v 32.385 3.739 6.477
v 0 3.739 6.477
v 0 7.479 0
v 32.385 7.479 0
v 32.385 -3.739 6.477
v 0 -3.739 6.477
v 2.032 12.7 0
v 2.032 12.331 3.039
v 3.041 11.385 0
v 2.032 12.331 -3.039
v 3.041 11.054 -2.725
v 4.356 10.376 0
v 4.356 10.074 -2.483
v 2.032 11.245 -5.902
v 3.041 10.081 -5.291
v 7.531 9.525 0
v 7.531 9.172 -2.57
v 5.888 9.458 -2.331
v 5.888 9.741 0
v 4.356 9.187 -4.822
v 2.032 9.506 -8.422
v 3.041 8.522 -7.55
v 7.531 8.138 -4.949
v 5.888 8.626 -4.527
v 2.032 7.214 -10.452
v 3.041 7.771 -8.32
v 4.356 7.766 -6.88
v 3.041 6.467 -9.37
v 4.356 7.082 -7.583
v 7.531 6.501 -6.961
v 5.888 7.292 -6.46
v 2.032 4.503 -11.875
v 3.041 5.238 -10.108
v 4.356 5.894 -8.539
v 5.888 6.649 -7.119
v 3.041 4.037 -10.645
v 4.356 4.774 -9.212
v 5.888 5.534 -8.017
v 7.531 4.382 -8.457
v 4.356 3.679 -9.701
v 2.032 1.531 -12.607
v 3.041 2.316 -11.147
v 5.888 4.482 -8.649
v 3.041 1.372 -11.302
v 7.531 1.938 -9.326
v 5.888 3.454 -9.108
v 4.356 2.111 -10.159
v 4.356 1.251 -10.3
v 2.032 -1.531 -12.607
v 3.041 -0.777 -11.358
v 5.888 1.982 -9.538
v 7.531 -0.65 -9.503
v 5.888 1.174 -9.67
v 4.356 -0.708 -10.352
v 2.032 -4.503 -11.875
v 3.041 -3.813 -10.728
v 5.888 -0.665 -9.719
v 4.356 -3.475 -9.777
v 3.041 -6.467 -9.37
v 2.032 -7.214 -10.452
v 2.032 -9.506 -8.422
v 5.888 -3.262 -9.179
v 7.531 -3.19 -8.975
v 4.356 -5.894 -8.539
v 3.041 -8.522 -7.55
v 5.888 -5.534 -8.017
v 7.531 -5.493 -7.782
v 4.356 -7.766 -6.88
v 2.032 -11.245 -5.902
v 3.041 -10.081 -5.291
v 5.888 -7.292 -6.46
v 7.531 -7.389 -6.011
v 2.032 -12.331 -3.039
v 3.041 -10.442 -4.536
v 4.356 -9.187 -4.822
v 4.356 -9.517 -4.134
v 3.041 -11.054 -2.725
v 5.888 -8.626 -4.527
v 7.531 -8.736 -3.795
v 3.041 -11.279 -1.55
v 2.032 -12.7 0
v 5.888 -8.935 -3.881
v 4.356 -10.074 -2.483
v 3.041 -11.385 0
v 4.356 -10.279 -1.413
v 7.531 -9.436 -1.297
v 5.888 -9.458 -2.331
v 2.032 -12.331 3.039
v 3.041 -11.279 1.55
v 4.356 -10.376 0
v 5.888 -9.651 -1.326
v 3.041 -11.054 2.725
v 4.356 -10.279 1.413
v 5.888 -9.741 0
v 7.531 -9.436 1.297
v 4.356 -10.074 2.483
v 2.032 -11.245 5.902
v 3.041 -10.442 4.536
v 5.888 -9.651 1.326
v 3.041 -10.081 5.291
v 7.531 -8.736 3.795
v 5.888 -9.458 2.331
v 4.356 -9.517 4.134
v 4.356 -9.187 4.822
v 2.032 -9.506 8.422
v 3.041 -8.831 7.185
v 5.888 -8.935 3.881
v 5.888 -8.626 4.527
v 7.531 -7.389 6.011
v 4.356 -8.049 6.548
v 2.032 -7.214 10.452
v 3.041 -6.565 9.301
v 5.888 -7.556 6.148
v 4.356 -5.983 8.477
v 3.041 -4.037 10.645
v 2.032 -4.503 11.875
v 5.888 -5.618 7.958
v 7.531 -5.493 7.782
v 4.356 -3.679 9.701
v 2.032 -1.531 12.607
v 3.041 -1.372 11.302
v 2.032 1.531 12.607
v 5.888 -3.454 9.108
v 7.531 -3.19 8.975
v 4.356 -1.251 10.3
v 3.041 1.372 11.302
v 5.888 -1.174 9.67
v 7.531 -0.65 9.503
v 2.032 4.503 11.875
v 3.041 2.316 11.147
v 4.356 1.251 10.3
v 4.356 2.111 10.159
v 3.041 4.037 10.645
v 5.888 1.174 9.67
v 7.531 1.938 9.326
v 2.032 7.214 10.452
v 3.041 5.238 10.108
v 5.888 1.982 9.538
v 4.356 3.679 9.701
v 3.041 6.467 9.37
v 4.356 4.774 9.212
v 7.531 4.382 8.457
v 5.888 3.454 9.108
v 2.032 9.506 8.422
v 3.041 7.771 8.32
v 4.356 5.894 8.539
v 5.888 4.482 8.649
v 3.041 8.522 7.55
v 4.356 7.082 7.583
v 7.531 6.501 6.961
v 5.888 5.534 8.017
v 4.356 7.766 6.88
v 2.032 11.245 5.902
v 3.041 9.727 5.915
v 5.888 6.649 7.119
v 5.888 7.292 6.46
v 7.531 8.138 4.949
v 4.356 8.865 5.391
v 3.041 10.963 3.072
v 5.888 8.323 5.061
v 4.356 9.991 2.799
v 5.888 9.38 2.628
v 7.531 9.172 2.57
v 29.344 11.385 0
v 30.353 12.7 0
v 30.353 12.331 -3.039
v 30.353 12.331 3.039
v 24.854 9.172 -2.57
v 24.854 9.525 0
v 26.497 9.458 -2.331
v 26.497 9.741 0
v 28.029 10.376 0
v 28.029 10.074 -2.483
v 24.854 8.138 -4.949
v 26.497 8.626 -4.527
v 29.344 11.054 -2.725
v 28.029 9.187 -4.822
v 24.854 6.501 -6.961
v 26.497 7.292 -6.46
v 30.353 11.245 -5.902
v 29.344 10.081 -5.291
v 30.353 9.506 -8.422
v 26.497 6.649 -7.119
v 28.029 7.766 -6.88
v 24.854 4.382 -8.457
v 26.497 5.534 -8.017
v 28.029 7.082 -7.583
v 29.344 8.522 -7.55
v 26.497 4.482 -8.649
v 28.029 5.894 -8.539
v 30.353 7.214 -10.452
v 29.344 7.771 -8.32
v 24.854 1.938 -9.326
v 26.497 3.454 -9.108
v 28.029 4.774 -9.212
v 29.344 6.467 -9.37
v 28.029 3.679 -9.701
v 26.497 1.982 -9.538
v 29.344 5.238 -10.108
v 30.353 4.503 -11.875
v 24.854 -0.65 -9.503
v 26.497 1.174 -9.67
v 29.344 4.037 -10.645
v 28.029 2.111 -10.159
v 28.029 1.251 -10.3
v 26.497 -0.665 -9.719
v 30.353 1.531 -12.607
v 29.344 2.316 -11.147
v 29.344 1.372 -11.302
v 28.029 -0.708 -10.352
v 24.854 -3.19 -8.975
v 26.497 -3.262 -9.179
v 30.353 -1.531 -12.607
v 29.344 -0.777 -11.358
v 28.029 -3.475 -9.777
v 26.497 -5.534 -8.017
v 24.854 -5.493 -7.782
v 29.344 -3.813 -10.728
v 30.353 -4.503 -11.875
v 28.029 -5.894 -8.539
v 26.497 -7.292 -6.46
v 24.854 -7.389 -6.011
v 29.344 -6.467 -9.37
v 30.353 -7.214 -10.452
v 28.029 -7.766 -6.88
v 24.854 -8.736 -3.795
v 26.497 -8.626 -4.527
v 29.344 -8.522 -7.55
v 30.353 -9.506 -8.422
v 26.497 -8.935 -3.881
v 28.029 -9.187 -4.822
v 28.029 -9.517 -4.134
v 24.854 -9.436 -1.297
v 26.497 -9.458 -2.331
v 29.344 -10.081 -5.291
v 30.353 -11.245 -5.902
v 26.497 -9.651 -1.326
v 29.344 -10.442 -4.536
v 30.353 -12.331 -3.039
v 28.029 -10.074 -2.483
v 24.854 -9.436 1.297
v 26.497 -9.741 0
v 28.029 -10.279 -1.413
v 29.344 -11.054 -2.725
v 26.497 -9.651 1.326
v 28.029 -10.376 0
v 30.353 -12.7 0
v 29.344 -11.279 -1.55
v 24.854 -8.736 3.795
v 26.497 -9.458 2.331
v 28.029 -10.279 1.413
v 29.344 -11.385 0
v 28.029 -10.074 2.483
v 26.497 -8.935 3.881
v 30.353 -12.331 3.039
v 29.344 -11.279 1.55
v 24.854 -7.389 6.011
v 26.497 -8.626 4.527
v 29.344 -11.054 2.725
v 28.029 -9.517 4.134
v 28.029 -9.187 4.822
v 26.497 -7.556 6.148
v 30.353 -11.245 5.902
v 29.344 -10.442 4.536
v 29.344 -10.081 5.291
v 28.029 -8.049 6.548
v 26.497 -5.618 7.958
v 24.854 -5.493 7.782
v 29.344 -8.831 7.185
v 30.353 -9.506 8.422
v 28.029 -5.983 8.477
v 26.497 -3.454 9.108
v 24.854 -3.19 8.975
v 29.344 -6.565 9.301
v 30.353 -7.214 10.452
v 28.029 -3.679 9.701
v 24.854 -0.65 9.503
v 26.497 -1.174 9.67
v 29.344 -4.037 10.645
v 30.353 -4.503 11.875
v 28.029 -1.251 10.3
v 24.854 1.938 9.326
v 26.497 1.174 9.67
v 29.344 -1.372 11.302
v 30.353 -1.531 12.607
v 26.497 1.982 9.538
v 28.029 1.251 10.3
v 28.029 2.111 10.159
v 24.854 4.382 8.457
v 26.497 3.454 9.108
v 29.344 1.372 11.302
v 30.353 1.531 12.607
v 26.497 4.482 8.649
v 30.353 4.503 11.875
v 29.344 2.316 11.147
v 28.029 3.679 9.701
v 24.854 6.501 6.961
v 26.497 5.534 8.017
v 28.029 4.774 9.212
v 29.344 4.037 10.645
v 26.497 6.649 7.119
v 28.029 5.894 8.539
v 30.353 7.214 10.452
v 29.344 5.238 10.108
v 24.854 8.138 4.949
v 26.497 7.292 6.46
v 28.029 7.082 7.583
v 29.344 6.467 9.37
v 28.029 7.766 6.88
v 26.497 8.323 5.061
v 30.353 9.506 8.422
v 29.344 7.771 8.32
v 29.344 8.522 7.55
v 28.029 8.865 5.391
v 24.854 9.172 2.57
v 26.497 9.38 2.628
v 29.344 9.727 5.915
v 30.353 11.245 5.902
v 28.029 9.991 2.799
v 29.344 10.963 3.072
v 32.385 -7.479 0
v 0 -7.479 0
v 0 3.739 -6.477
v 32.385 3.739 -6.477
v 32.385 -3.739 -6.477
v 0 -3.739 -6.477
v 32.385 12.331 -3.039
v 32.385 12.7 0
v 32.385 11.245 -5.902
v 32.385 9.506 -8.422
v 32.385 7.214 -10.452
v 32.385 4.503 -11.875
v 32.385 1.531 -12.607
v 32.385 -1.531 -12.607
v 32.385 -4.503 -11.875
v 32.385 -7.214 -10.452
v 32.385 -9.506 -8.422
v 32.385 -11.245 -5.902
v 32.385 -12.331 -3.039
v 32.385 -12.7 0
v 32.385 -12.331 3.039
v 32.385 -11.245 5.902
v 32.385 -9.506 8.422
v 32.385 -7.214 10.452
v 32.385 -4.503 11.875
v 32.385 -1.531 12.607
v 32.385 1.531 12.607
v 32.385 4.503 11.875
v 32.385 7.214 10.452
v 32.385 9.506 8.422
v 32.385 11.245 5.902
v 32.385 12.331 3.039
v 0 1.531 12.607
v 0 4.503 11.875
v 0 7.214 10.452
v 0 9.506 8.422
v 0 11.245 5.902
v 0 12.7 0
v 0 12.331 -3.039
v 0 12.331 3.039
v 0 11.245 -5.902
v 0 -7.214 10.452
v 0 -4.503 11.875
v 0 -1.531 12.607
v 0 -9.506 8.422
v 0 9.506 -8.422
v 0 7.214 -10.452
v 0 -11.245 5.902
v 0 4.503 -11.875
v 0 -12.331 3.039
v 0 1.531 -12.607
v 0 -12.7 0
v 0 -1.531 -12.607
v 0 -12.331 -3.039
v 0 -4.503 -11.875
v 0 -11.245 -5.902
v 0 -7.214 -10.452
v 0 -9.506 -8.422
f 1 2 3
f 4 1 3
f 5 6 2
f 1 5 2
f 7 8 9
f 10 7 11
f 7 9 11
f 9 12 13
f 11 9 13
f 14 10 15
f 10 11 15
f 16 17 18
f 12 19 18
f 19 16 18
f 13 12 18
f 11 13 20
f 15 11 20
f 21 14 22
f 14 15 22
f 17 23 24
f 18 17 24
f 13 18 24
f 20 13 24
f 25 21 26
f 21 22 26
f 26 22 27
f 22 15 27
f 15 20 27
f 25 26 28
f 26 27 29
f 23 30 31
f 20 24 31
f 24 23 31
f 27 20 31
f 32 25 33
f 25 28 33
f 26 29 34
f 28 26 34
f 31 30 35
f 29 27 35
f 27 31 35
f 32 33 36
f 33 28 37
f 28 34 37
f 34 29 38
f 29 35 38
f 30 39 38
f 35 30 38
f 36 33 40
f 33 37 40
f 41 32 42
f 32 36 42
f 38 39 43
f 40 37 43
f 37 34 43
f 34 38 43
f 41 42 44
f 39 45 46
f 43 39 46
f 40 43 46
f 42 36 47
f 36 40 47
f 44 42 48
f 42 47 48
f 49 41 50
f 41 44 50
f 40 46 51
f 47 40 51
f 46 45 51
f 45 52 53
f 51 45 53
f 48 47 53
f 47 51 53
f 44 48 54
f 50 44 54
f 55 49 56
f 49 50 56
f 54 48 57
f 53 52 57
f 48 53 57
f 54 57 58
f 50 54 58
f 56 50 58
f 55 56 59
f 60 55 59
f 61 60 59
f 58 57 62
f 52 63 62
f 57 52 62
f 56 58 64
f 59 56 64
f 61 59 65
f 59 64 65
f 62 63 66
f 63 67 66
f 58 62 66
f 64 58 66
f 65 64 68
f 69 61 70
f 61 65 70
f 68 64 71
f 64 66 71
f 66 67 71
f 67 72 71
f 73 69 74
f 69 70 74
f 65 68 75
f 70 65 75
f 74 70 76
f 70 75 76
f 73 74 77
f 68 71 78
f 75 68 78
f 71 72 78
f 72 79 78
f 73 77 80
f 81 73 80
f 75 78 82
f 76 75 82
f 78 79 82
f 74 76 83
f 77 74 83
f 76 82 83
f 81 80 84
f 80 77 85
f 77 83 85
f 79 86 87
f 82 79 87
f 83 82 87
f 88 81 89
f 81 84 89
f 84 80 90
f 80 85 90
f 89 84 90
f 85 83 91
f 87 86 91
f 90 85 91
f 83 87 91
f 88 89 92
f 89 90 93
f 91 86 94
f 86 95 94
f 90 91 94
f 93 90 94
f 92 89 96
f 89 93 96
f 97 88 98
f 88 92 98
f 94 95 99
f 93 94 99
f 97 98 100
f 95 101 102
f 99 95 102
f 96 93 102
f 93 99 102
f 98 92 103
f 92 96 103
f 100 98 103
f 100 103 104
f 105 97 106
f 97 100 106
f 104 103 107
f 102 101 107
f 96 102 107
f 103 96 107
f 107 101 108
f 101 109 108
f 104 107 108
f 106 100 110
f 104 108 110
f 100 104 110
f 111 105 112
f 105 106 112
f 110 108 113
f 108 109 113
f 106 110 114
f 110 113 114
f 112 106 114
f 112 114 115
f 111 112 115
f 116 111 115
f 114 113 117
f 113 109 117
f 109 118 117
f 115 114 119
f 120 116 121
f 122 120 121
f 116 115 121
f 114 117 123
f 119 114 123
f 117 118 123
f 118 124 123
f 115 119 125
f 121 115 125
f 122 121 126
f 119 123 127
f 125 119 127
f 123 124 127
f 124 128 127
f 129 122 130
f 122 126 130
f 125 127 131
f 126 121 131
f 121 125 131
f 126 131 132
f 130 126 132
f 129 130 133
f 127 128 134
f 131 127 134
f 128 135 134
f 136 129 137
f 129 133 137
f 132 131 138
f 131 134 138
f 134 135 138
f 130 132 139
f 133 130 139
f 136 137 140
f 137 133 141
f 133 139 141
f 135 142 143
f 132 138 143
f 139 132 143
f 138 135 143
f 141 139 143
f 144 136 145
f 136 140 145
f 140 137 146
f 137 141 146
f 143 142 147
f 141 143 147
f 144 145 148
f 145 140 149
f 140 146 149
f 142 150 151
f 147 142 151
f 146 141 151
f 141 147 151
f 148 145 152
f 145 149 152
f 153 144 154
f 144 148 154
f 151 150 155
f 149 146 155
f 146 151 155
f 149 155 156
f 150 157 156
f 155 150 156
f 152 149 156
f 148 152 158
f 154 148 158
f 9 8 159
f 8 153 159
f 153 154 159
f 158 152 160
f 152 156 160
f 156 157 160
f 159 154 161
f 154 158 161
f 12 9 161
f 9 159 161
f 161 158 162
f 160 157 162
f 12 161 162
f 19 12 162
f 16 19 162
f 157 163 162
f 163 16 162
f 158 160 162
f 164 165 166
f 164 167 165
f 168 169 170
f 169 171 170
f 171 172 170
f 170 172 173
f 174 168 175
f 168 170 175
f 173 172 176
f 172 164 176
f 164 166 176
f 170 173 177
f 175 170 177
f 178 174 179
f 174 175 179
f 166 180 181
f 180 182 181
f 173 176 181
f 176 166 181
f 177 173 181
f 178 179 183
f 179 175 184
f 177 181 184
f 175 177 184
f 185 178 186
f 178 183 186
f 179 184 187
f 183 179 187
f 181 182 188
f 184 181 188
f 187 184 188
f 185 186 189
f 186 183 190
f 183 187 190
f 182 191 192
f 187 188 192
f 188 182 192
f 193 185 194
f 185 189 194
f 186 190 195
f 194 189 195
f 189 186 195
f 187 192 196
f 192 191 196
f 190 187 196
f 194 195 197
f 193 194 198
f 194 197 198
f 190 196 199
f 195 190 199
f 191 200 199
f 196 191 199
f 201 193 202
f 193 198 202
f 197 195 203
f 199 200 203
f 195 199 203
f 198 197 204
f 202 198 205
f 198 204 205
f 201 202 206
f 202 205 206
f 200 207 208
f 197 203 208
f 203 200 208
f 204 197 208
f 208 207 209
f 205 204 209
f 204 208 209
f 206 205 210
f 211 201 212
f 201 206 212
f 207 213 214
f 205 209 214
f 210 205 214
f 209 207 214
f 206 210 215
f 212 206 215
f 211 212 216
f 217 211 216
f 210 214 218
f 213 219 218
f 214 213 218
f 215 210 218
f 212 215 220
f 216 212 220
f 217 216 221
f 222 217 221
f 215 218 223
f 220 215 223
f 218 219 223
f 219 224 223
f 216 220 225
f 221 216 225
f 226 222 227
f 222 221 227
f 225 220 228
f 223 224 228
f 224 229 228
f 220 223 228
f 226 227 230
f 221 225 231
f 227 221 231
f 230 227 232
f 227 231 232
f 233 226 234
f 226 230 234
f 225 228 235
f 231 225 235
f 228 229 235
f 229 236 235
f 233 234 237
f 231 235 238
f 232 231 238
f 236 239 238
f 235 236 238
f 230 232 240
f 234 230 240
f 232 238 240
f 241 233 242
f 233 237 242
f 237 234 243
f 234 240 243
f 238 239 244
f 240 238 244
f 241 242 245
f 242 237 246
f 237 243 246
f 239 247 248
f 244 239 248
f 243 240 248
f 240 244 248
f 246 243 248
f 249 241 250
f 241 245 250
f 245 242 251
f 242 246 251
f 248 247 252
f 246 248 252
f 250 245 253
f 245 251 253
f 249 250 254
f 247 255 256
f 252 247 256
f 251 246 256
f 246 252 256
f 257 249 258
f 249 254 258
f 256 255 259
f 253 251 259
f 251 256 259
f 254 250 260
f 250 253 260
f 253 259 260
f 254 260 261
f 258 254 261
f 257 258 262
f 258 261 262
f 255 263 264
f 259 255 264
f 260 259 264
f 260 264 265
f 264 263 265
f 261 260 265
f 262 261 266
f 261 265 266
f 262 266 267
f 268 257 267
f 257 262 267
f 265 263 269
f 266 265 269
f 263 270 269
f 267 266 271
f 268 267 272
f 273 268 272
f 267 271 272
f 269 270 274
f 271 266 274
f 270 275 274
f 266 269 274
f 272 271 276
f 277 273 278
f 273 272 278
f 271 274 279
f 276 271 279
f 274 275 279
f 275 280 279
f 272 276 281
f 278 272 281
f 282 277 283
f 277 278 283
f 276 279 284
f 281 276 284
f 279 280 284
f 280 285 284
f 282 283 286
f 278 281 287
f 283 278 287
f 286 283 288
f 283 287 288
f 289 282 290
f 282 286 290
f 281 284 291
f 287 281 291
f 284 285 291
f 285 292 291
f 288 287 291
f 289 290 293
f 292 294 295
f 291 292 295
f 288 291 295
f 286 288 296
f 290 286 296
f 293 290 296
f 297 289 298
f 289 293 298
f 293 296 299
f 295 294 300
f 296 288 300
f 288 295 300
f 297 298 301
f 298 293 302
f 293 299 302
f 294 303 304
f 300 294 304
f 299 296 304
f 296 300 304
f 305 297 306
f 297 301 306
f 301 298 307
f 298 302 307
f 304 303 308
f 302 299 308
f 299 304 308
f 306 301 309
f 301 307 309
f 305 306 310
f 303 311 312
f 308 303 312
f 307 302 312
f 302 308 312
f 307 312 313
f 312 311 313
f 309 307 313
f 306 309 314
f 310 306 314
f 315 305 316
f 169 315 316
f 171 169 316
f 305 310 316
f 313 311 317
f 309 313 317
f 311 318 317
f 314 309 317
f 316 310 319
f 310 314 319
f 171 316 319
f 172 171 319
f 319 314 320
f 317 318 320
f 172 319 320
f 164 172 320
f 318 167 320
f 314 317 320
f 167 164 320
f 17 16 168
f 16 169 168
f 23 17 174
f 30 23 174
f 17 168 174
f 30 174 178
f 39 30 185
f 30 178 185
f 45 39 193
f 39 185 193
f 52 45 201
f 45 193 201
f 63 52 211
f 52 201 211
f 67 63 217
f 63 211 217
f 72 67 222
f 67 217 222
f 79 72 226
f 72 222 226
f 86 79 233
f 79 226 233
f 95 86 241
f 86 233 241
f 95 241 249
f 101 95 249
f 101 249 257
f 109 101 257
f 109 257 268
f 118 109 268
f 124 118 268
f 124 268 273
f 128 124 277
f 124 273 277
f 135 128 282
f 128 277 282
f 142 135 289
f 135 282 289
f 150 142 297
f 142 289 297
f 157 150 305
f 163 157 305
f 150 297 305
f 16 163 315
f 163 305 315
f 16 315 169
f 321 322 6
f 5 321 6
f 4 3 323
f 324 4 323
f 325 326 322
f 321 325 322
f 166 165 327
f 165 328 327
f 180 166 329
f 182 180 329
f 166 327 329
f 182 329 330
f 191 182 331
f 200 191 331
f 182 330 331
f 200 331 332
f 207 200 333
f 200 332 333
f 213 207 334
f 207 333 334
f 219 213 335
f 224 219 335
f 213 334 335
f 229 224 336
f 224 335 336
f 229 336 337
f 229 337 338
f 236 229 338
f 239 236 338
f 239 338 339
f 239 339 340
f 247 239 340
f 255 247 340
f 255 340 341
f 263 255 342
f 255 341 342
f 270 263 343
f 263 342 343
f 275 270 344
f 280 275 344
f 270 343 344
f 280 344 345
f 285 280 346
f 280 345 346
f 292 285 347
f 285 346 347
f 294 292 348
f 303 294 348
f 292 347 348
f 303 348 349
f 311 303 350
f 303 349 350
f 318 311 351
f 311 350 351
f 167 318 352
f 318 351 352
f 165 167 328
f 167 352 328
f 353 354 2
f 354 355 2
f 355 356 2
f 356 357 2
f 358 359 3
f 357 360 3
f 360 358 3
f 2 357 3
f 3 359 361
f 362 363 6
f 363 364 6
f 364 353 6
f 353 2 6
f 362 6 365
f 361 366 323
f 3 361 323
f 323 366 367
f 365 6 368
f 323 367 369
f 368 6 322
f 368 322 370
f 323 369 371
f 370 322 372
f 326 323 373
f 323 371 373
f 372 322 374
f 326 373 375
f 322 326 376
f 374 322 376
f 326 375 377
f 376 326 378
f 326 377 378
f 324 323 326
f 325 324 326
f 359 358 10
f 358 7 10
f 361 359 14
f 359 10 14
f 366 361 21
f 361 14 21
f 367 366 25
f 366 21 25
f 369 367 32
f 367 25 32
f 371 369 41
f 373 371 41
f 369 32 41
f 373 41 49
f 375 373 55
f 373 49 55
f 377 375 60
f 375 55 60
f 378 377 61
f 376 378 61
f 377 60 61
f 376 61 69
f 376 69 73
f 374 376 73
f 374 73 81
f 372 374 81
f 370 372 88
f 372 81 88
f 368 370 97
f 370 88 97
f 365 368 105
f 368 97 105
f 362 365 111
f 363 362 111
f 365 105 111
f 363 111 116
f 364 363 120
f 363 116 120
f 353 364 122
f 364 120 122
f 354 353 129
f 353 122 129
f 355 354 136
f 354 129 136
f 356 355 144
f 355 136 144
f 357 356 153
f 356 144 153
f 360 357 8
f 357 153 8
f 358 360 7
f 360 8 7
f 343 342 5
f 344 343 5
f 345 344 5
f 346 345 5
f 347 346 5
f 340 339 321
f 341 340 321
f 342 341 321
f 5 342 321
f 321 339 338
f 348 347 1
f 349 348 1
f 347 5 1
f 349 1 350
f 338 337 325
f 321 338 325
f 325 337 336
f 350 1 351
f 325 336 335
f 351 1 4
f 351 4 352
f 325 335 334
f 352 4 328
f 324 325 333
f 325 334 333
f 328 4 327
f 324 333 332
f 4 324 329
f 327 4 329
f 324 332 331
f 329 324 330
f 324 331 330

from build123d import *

# Parameters (mm, degrees)
CUT_EXTRUDE1_DEPTH = 33.385


with BuildPart() as part:
    # Sketch1 → Revolve1 (revolve)
    with BuildSketch(Plane.XY):
        with BuildLine():
            Line((0, 0), (0, 12.7))
            Line((0, 12.7), (2.032, 12.7))
            ThreePointArc((2.032, 12.7), (4.356261314, 10.375738686), (7.531261314, 9.525))
            Line((7.531261314, 9.525), (24.853738686, 9.525))
            ThreePointArc((24.853738686, 9.525), (28.028738686, 10.375738686), (30.353, 12.7))
            Line((30.353, 12.7), (32.385, 12.7))
            Line((32.385, 12.7), (32.385, 0))
            Line((32.385, 0), (0, 0))
        make_face()
    revolve(axis=Axis((0, 0, 0), (-1, 0, 0)))

    # Sketch2 → Cut-Extrude1 (cut, through all)
    with BuildSketch(Plane.ZY):
        Polygon((0, 7.478995387), (-6.477, 3.739497694), (-6.477, -3.739497694), (0, -7.478995387), (6.477, -3.739497694), (6.477, 3.739497694), align=None)
    extrude(amount=-CUT_EXTRUDE1_DEPTH, mode=Mode.SUBTRACT)


solid = part.part
